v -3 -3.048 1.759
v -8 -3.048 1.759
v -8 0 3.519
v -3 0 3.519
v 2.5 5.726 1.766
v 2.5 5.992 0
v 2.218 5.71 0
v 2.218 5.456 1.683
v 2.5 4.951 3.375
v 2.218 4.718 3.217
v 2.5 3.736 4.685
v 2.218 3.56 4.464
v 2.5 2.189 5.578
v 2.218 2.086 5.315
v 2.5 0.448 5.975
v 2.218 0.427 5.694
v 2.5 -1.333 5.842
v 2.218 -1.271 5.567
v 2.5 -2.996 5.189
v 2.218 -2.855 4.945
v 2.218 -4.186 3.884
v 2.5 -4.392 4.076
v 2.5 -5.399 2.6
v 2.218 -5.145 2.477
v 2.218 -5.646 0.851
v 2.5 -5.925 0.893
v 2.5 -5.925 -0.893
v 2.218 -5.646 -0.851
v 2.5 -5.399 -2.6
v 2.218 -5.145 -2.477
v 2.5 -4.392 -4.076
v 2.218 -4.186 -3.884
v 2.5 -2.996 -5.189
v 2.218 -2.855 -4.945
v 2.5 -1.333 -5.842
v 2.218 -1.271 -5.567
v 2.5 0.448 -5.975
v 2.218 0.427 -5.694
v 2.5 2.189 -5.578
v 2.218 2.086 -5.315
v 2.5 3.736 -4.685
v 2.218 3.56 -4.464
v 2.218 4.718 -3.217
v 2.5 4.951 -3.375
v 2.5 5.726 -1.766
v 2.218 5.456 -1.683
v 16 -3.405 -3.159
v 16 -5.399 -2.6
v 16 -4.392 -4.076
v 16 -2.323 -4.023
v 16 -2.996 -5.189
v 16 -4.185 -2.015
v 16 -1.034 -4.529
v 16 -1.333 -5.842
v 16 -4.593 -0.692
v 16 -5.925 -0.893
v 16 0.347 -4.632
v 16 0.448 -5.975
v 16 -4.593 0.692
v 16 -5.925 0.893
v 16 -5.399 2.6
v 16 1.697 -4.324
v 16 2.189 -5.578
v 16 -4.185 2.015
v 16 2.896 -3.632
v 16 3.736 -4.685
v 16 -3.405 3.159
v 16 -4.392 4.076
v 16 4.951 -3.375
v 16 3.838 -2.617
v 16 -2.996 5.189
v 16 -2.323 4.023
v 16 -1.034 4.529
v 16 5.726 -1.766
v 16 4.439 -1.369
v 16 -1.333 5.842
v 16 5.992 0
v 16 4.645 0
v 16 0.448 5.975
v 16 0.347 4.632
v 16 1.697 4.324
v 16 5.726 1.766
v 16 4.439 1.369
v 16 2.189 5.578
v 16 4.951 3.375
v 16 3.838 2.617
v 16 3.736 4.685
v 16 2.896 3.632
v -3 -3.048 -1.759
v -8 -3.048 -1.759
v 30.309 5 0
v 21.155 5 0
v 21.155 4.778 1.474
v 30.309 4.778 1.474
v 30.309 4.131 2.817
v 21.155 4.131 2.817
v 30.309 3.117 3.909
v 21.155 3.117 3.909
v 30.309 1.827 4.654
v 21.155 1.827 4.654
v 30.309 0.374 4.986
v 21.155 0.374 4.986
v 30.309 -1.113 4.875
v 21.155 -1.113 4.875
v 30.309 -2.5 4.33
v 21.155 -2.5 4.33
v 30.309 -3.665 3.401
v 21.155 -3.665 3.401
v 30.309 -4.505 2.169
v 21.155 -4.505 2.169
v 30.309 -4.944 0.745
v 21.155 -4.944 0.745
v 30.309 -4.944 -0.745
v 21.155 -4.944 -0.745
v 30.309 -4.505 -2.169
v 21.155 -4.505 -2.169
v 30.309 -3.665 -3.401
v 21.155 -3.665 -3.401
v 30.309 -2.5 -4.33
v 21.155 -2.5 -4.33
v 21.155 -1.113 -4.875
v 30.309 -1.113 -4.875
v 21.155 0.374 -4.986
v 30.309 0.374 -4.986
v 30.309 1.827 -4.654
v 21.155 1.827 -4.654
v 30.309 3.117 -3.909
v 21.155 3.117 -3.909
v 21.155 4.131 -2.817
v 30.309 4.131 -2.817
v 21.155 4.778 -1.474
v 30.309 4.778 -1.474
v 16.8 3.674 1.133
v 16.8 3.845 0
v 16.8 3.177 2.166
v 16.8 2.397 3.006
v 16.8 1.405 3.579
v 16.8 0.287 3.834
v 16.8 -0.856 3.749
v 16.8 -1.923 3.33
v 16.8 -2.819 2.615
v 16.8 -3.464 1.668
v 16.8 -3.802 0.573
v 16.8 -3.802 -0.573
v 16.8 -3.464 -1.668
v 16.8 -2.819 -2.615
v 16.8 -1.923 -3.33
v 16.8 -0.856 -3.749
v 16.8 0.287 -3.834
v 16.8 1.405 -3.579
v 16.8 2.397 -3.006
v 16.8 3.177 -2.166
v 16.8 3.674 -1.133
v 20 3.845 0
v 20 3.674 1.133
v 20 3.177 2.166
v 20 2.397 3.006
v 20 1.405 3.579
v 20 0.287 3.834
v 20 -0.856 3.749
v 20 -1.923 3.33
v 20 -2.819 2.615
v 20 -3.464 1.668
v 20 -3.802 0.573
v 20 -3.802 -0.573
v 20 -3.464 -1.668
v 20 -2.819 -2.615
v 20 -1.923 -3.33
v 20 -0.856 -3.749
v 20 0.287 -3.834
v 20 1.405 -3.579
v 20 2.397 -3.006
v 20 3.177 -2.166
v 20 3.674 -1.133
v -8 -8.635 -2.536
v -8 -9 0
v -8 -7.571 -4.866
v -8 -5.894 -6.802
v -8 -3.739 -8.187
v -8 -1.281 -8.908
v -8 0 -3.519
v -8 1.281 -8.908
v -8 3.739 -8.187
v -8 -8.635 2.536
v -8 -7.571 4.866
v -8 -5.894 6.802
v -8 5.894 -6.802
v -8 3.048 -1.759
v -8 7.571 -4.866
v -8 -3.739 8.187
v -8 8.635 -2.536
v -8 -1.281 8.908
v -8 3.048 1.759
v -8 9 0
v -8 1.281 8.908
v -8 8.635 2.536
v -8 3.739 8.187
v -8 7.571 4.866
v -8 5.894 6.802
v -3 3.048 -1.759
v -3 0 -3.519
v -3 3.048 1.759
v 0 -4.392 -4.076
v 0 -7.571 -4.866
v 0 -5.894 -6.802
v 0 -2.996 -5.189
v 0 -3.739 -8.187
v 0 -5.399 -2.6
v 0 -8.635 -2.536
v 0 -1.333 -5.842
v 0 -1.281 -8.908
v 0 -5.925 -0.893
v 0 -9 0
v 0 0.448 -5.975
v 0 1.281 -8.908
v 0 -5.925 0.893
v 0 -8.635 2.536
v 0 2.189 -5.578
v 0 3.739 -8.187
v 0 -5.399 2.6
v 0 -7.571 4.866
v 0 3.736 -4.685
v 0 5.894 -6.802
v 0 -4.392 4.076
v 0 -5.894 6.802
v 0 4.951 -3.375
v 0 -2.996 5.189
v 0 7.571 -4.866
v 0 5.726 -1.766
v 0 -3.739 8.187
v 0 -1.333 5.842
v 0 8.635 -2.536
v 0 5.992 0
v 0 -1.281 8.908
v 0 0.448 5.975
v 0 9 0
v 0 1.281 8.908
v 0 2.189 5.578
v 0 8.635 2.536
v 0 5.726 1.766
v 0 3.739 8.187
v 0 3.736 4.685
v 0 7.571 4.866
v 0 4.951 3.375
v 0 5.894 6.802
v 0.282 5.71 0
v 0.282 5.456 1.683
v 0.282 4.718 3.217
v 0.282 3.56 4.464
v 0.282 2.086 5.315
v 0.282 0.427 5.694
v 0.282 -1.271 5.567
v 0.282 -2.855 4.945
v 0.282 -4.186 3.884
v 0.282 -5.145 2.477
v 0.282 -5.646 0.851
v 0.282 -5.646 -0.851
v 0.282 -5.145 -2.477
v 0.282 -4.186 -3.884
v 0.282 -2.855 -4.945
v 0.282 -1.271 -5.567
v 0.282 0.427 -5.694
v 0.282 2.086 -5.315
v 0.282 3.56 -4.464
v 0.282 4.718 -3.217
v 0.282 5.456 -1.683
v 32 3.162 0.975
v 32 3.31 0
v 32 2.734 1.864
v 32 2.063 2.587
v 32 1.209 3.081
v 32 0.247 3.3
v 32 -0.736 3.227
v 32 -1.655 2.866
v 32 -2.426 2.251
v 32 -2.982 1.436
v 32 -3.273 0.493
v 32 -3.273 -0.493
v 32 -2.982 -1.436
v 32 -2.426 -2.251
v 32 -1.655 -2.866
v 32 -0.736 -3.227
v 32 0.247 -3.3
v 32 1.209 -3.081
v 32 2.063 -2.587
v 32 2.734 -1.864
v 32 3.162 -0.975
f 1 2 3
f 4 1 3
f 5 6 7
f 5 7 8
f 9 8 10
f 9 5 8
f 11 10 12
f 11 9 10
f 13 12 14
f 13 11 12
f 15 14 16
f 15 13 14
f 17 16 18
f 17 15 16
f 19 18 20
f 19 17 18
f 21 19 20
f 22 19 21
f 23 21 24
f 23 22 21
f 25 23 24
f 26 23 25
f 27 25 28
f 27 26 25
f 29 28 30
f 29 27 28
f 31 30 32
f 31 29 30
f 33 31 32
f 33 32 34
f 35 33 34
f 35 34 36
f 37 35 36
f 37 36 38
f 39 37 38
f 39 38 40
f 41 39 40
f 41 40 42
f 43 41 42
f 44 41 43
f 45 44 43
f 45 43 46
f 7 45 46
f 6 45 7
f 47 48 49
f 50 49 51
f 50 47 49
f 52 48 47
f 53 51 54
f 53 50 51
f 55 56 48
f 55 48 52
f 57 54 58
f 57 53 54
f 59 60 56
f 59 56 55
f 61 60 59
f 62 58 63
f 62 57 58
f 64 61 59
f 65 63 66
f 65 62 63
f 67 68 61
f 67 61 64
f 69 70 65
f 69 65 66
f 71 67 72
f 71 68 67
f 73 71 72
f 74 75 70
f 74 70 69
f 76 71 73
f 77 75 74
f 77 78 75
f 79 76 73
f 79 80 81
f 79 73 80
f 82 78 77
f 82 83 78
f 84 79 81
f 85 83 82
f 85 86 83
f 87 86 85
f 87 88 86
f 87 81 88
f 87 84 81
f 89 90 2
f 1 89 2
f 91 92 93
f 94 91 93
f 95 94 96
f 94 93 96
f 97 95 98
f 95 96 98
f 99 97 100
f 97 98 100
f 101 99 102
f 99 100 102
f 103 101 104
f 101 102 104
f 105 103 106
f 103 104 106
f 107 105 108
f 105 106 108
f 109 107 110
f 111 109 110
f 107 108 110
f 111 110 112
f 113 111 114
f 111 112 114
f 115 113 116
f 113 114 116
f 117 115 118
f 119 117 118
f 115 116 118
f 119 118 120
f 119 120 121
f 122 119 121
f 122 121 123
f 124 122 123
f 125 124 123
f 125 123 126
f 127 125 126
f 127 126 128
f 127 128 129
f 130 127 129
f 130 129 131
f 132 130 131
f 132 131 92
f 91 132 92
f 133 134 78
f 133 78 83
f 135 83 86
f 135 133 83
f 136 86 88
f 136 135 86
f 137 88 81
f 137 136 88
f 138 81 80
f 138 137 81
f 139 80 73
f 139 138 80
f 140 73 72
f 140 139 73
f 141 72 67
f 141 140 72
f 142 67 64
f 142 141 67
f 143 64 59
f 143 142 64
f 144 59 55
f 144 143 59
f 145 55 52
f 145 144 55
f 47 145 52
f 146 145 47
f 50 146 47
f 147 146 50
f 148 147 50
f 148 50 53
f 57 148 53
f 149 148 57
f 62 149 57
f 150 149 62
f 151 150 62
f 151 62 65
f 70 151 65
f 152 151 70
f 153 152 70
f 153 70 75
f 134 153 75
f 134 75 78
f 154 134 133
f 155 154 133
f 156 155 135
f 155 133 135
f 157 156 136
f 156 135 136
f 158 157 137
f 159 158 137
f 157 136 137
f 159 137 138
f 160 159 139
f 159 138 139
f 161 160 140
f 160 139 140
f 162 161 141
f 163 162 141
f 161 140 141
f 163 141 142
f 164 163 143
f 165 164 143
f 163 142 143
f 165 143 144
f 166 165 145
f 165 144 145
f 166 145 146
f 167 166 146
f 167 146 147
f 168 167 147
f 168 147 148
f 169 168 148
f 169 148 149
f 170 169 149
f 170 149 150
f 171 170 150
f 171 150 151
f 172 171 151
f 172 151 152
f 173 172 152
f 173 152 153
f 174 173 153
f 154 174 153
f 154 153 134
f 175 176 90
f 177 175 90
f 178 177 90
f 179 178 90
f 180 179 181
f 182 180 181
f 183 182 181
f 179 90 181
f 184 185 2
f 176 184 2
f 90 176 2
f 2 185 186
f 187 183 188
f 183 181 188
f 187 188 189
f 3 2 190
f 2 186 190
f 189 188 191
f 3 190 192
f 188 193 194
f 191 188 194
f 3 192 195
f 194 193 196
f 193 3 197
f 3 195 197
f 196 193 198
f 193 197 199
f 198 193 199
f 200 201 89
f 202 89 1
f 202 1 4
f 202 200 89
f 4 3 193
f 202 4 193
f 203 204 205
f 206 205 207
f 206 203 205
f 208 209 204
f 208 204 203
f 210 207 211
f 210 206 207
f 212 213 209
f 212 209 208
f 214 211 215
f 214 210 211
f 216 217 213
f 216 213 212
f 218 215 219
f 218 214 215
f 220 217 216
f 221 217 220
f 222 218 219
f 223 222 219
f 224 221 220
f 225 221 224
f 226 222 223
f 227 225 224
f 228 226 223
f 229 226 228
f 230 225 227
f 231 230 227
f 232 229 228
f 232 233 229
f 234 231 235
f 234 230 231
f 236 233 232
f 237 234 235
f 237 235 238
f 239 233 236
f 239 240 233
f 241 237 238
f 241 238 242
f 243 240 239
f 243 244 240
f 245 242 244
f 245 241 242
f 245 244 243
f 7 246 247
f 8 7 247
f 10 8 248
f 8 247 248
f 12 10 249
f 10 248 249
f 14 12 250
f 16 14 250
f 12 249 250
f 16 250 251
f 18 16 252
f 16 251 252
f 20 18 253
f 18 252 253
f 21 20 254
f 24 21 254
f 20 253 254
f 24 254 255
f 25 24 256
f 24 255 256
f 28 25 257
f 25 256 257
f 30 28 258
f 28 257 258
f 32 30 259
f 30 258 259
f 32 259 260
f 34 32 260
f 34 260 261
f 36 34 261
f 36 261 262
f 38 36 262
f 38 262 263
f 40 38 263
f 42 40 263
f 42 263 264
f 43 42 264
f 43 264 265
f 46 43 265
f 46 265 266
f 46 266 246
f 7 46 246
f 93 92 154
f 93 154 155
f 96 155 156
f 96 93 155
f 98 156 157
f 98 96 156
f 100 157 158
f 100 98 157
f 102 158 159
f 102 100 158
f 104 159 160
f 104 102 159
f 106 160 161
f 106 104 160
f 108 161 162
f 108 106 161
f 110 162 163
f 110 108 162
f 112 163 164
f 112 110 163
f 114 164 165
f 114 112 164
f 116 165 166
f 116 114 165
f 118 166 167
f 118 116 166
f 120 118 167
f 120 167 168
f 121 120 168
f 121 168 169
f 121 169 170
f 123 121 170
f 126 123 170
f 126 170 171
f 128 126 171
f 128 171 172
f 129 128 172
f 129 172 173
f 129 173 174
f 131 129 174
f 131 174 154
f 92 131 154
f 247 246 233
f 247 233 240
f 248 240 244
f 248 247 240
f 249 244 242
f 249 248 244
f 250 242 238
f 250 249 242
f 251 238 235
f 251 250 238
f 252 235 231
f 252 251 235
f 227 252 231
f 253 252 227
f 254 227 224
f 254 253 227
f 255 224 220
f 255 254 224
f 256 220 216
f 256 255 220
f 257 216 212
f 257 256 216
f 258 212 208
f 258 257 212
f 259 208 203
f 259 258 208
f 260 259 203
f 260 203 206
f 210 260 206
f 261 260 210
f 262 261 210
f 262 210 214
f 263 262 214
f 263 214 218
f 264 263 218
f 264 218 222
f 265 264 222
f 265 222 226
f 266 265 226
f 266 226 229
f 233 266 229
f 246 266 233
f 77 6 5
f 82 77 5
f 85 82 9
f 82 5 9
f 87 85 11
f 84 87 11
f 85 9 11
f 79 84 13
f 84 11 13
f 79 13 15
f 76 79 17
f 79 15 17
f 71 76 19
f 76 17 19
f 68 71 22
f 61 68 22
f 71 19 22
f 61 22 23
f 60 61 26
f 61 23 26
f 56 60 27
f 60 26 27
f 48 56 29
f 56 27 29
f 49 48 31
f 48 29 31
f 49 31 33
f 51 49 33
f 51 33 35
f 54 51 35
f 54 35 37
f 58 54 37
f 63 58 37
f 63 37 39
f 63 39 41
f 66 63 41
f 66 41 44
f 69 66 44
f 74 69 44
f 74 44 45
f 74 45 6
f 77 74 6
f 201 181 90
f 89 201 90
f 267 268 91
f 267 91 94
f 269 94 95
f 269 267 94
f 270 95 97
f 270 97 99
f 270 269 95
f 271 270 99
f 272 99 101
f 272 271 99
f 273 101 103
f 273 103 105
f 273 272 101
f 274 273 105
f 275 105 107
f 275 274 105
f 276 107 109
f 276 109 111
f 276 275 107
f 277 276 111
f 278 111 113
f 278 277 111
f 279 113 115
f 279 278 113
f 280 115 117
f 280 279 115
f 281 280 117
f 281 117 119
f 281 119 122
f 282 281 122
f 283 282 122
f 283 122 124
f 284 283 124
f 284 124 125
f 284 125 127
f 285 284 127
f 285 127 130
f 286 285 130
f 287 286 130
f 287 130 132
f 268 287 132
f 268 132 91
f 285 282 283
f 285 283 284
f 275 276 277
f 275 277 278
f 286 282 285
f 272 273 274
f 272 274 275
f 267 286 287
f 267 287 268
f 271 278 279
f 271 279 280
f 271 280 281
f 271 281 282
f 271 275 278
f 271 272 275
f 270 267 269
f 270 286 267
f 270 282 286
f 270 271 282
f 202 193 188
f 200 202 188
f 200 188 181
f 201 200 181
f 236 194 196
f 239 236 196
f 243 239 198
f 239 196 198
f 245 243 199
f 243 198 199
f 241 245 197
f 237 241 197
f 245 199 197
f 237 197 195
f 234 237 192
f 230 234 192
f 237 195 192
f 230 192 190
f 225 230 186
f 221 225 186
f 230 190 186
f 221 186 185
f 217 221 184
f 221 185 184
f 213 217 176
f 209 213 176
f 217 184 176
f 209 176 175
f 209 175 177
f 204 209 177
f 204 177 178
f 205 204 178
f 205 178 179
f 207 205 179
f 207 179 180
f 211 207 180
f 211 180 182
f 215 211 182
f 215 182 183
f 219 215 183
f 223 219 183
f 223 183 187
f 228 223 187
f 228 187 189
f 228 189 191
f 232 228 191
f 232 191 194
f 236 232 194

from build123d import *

# Parameters (mm, degrees)
PROPERTYMANAGER_START         = -3
PROPERTYMANAGER_OUTLINE_R     = 5.71
PROPERTYMANAGER_DEPTH         = 19
PROPERTYMANAGER_START_2       = -8
PROPERTYMANAGER_2_OUTLINE_R   = 9
PROPERTYMANAGER_2_DEPTH       = 8
PROPERTYMANAGER_START_3       = 21.1549999
PROPERTYMANAGER_3_OUTLINE_R   = 5
PROPERTYMANAGER_3_DEPTH       = 9.1545
PROPERTYMANAGER_START_4       = 16
PROPERTYMANAGER_4_OUTLINE_R   = 3.845
PROPERTYMANAGER_4_DEPTH       = 14.3094999
PROPERTYMANAGER_START_5       = 2.4999999
PROPERTYMANAGER_5_OUTLINE_R   = 5.992
PROPERTYMANAGER_5_OUTLINE_R_2 = 5.71
PROPERTYMANAGER_5_DEPTH       = 13.5000001
HEXDRIVE_DEPTH                = 5


with BuildPart() as part:
    # PropertyManager: read off the stored shape, not the designer's step
    # PropertyManager outline → PropertyManager (new body)
    with BuildSketch(Plane.YZ.offset(PROPERTYMANAGER_START)):
        Circle(PROPERTYMANAGER_OUTLINE_R)
    extrude(amount=PROPERTYMANAGER_DEPTH)

    # PropertyManager 2 outline → PropertyManager 2 (add)
    with BuildSketch(Plane.YZ.offset(PROPERTYMANAGER_START_2)):
        Circle(PROPERTYMANAGER_2_OUTLINE_R)
        Polygon((0, 3.518949891), (3.0475, 1.759474945), (3.0475, -1.759474945), (0, -3.518949891), (-3.0475, -1.759474945), (-3.0475, 1.759474945), align=None, mode=Mode.SUBTRACT)
    extrude(amount=PROPERTYMANAGER_2_DEPTH)



with BuildPart() as body_2:
    # PropertyManager 3 outline → PropertyManager 3 (new body)
    with BuildSketch(Plane.YZ.offset(PROPERTYMANAGER_START_3)):
        Circle(PROPERTYMANAGER_3_OUTLINE_R)
    extrude(amount=PROPERTYMANAGER_3_DEPTH)


with BuildPart() as part_1:
    add(part.part)

    add(body_2.part)  # PropertyManager 4 merges body 2
    # PropertyManager 4 outline → PropertyManager 4 (add)
    with BuildSketch(Plane.YZ.offset(PROPERTYMANAGER_START_4)):
        Circle(PROPERTYMANAGER_4_OUTLINE_R)
    extrude(amount=PROPERTYMANAGER_4_DEPTH)

    # PropertyManager 5 outline → PropertyManager 5 (add)
    with BuildSketch(Plane.YZ.offset(PROPERTYMANAGER_START_5)):
        Circle(PROPERTYMANAGER_5_OUTLINE_R)
        Circle(PROPERTYMANAGER_5_OUTLINE_R_2, mode=Mode.SUBTRACT)
    extrude(amount=PROPERTYMANAGER_5_DEPTH)

    # PropertyManager 6 outline → PropertyManager 6 (revolve)
    with BuildSketch(Plane.YX):
        Polygon((3.3095, 32), (0, 32), (0, 30.3094999), (5, 30.30949995), align=None)
        Polygon((3.845, 21.1549999), (3.845, 20), (5, 21.15499995), align=None)
        Polygon((4.645, 16), (3.845, 16.8), (3.845, 16), align=None)
        Polygon((5.992, 2.4999999), (5.71, 2.4999999), (5.71, 2.218), align=None)
        Polygon((5.992, 0), (5.71, 0.282), (5.71, 0), align=None)
    revolve(axis=Axis((0, 0, 0), (1, 0, 0)))

    # BodySketch → BaseBody (revolve)
    with BuildSketch(Plane(origin=(0, 0, 0), x_dir=(1, 0, 0), z_dir=(0, 1, 0)), mode=Mode.PRIVATE) as basebody_sk:
        Polygon((0, 9), (-8, 9), (-8, 0), (32, 0), (32, 3.3095), (30.3095, 5), (21.155, 5), (20, 3.845), (16.8, 3.845), (16, 4.645), (16, 5.992), (2.5, 5.992), (2.218, 5.71), (0.282, 5.71), (0, 5.992), align=None)
    revolve(basebody_sk.sketch.rotate(Axis((-8, 0, 0), (1, 0, 0)), 180), axis=Axis((-8, 0, 0), (1, 0, 0)))

    # DriveSketch → HexDrive (cut)
    with BuildSketch(Plane.ZY.offset(8)):
        Polygon((3.518949891, 0), (1.759474945, 3.0475), (-1.759474945, 3.0475), (-3.518949891, 0), (-1.759474945, -3.0475), (1.759474945, -3.0475), align=None)
    extrude(amount=-HEXDRIVE_DEPTH, mode=Mode.SUBTRACT)


solid = part_1.part
